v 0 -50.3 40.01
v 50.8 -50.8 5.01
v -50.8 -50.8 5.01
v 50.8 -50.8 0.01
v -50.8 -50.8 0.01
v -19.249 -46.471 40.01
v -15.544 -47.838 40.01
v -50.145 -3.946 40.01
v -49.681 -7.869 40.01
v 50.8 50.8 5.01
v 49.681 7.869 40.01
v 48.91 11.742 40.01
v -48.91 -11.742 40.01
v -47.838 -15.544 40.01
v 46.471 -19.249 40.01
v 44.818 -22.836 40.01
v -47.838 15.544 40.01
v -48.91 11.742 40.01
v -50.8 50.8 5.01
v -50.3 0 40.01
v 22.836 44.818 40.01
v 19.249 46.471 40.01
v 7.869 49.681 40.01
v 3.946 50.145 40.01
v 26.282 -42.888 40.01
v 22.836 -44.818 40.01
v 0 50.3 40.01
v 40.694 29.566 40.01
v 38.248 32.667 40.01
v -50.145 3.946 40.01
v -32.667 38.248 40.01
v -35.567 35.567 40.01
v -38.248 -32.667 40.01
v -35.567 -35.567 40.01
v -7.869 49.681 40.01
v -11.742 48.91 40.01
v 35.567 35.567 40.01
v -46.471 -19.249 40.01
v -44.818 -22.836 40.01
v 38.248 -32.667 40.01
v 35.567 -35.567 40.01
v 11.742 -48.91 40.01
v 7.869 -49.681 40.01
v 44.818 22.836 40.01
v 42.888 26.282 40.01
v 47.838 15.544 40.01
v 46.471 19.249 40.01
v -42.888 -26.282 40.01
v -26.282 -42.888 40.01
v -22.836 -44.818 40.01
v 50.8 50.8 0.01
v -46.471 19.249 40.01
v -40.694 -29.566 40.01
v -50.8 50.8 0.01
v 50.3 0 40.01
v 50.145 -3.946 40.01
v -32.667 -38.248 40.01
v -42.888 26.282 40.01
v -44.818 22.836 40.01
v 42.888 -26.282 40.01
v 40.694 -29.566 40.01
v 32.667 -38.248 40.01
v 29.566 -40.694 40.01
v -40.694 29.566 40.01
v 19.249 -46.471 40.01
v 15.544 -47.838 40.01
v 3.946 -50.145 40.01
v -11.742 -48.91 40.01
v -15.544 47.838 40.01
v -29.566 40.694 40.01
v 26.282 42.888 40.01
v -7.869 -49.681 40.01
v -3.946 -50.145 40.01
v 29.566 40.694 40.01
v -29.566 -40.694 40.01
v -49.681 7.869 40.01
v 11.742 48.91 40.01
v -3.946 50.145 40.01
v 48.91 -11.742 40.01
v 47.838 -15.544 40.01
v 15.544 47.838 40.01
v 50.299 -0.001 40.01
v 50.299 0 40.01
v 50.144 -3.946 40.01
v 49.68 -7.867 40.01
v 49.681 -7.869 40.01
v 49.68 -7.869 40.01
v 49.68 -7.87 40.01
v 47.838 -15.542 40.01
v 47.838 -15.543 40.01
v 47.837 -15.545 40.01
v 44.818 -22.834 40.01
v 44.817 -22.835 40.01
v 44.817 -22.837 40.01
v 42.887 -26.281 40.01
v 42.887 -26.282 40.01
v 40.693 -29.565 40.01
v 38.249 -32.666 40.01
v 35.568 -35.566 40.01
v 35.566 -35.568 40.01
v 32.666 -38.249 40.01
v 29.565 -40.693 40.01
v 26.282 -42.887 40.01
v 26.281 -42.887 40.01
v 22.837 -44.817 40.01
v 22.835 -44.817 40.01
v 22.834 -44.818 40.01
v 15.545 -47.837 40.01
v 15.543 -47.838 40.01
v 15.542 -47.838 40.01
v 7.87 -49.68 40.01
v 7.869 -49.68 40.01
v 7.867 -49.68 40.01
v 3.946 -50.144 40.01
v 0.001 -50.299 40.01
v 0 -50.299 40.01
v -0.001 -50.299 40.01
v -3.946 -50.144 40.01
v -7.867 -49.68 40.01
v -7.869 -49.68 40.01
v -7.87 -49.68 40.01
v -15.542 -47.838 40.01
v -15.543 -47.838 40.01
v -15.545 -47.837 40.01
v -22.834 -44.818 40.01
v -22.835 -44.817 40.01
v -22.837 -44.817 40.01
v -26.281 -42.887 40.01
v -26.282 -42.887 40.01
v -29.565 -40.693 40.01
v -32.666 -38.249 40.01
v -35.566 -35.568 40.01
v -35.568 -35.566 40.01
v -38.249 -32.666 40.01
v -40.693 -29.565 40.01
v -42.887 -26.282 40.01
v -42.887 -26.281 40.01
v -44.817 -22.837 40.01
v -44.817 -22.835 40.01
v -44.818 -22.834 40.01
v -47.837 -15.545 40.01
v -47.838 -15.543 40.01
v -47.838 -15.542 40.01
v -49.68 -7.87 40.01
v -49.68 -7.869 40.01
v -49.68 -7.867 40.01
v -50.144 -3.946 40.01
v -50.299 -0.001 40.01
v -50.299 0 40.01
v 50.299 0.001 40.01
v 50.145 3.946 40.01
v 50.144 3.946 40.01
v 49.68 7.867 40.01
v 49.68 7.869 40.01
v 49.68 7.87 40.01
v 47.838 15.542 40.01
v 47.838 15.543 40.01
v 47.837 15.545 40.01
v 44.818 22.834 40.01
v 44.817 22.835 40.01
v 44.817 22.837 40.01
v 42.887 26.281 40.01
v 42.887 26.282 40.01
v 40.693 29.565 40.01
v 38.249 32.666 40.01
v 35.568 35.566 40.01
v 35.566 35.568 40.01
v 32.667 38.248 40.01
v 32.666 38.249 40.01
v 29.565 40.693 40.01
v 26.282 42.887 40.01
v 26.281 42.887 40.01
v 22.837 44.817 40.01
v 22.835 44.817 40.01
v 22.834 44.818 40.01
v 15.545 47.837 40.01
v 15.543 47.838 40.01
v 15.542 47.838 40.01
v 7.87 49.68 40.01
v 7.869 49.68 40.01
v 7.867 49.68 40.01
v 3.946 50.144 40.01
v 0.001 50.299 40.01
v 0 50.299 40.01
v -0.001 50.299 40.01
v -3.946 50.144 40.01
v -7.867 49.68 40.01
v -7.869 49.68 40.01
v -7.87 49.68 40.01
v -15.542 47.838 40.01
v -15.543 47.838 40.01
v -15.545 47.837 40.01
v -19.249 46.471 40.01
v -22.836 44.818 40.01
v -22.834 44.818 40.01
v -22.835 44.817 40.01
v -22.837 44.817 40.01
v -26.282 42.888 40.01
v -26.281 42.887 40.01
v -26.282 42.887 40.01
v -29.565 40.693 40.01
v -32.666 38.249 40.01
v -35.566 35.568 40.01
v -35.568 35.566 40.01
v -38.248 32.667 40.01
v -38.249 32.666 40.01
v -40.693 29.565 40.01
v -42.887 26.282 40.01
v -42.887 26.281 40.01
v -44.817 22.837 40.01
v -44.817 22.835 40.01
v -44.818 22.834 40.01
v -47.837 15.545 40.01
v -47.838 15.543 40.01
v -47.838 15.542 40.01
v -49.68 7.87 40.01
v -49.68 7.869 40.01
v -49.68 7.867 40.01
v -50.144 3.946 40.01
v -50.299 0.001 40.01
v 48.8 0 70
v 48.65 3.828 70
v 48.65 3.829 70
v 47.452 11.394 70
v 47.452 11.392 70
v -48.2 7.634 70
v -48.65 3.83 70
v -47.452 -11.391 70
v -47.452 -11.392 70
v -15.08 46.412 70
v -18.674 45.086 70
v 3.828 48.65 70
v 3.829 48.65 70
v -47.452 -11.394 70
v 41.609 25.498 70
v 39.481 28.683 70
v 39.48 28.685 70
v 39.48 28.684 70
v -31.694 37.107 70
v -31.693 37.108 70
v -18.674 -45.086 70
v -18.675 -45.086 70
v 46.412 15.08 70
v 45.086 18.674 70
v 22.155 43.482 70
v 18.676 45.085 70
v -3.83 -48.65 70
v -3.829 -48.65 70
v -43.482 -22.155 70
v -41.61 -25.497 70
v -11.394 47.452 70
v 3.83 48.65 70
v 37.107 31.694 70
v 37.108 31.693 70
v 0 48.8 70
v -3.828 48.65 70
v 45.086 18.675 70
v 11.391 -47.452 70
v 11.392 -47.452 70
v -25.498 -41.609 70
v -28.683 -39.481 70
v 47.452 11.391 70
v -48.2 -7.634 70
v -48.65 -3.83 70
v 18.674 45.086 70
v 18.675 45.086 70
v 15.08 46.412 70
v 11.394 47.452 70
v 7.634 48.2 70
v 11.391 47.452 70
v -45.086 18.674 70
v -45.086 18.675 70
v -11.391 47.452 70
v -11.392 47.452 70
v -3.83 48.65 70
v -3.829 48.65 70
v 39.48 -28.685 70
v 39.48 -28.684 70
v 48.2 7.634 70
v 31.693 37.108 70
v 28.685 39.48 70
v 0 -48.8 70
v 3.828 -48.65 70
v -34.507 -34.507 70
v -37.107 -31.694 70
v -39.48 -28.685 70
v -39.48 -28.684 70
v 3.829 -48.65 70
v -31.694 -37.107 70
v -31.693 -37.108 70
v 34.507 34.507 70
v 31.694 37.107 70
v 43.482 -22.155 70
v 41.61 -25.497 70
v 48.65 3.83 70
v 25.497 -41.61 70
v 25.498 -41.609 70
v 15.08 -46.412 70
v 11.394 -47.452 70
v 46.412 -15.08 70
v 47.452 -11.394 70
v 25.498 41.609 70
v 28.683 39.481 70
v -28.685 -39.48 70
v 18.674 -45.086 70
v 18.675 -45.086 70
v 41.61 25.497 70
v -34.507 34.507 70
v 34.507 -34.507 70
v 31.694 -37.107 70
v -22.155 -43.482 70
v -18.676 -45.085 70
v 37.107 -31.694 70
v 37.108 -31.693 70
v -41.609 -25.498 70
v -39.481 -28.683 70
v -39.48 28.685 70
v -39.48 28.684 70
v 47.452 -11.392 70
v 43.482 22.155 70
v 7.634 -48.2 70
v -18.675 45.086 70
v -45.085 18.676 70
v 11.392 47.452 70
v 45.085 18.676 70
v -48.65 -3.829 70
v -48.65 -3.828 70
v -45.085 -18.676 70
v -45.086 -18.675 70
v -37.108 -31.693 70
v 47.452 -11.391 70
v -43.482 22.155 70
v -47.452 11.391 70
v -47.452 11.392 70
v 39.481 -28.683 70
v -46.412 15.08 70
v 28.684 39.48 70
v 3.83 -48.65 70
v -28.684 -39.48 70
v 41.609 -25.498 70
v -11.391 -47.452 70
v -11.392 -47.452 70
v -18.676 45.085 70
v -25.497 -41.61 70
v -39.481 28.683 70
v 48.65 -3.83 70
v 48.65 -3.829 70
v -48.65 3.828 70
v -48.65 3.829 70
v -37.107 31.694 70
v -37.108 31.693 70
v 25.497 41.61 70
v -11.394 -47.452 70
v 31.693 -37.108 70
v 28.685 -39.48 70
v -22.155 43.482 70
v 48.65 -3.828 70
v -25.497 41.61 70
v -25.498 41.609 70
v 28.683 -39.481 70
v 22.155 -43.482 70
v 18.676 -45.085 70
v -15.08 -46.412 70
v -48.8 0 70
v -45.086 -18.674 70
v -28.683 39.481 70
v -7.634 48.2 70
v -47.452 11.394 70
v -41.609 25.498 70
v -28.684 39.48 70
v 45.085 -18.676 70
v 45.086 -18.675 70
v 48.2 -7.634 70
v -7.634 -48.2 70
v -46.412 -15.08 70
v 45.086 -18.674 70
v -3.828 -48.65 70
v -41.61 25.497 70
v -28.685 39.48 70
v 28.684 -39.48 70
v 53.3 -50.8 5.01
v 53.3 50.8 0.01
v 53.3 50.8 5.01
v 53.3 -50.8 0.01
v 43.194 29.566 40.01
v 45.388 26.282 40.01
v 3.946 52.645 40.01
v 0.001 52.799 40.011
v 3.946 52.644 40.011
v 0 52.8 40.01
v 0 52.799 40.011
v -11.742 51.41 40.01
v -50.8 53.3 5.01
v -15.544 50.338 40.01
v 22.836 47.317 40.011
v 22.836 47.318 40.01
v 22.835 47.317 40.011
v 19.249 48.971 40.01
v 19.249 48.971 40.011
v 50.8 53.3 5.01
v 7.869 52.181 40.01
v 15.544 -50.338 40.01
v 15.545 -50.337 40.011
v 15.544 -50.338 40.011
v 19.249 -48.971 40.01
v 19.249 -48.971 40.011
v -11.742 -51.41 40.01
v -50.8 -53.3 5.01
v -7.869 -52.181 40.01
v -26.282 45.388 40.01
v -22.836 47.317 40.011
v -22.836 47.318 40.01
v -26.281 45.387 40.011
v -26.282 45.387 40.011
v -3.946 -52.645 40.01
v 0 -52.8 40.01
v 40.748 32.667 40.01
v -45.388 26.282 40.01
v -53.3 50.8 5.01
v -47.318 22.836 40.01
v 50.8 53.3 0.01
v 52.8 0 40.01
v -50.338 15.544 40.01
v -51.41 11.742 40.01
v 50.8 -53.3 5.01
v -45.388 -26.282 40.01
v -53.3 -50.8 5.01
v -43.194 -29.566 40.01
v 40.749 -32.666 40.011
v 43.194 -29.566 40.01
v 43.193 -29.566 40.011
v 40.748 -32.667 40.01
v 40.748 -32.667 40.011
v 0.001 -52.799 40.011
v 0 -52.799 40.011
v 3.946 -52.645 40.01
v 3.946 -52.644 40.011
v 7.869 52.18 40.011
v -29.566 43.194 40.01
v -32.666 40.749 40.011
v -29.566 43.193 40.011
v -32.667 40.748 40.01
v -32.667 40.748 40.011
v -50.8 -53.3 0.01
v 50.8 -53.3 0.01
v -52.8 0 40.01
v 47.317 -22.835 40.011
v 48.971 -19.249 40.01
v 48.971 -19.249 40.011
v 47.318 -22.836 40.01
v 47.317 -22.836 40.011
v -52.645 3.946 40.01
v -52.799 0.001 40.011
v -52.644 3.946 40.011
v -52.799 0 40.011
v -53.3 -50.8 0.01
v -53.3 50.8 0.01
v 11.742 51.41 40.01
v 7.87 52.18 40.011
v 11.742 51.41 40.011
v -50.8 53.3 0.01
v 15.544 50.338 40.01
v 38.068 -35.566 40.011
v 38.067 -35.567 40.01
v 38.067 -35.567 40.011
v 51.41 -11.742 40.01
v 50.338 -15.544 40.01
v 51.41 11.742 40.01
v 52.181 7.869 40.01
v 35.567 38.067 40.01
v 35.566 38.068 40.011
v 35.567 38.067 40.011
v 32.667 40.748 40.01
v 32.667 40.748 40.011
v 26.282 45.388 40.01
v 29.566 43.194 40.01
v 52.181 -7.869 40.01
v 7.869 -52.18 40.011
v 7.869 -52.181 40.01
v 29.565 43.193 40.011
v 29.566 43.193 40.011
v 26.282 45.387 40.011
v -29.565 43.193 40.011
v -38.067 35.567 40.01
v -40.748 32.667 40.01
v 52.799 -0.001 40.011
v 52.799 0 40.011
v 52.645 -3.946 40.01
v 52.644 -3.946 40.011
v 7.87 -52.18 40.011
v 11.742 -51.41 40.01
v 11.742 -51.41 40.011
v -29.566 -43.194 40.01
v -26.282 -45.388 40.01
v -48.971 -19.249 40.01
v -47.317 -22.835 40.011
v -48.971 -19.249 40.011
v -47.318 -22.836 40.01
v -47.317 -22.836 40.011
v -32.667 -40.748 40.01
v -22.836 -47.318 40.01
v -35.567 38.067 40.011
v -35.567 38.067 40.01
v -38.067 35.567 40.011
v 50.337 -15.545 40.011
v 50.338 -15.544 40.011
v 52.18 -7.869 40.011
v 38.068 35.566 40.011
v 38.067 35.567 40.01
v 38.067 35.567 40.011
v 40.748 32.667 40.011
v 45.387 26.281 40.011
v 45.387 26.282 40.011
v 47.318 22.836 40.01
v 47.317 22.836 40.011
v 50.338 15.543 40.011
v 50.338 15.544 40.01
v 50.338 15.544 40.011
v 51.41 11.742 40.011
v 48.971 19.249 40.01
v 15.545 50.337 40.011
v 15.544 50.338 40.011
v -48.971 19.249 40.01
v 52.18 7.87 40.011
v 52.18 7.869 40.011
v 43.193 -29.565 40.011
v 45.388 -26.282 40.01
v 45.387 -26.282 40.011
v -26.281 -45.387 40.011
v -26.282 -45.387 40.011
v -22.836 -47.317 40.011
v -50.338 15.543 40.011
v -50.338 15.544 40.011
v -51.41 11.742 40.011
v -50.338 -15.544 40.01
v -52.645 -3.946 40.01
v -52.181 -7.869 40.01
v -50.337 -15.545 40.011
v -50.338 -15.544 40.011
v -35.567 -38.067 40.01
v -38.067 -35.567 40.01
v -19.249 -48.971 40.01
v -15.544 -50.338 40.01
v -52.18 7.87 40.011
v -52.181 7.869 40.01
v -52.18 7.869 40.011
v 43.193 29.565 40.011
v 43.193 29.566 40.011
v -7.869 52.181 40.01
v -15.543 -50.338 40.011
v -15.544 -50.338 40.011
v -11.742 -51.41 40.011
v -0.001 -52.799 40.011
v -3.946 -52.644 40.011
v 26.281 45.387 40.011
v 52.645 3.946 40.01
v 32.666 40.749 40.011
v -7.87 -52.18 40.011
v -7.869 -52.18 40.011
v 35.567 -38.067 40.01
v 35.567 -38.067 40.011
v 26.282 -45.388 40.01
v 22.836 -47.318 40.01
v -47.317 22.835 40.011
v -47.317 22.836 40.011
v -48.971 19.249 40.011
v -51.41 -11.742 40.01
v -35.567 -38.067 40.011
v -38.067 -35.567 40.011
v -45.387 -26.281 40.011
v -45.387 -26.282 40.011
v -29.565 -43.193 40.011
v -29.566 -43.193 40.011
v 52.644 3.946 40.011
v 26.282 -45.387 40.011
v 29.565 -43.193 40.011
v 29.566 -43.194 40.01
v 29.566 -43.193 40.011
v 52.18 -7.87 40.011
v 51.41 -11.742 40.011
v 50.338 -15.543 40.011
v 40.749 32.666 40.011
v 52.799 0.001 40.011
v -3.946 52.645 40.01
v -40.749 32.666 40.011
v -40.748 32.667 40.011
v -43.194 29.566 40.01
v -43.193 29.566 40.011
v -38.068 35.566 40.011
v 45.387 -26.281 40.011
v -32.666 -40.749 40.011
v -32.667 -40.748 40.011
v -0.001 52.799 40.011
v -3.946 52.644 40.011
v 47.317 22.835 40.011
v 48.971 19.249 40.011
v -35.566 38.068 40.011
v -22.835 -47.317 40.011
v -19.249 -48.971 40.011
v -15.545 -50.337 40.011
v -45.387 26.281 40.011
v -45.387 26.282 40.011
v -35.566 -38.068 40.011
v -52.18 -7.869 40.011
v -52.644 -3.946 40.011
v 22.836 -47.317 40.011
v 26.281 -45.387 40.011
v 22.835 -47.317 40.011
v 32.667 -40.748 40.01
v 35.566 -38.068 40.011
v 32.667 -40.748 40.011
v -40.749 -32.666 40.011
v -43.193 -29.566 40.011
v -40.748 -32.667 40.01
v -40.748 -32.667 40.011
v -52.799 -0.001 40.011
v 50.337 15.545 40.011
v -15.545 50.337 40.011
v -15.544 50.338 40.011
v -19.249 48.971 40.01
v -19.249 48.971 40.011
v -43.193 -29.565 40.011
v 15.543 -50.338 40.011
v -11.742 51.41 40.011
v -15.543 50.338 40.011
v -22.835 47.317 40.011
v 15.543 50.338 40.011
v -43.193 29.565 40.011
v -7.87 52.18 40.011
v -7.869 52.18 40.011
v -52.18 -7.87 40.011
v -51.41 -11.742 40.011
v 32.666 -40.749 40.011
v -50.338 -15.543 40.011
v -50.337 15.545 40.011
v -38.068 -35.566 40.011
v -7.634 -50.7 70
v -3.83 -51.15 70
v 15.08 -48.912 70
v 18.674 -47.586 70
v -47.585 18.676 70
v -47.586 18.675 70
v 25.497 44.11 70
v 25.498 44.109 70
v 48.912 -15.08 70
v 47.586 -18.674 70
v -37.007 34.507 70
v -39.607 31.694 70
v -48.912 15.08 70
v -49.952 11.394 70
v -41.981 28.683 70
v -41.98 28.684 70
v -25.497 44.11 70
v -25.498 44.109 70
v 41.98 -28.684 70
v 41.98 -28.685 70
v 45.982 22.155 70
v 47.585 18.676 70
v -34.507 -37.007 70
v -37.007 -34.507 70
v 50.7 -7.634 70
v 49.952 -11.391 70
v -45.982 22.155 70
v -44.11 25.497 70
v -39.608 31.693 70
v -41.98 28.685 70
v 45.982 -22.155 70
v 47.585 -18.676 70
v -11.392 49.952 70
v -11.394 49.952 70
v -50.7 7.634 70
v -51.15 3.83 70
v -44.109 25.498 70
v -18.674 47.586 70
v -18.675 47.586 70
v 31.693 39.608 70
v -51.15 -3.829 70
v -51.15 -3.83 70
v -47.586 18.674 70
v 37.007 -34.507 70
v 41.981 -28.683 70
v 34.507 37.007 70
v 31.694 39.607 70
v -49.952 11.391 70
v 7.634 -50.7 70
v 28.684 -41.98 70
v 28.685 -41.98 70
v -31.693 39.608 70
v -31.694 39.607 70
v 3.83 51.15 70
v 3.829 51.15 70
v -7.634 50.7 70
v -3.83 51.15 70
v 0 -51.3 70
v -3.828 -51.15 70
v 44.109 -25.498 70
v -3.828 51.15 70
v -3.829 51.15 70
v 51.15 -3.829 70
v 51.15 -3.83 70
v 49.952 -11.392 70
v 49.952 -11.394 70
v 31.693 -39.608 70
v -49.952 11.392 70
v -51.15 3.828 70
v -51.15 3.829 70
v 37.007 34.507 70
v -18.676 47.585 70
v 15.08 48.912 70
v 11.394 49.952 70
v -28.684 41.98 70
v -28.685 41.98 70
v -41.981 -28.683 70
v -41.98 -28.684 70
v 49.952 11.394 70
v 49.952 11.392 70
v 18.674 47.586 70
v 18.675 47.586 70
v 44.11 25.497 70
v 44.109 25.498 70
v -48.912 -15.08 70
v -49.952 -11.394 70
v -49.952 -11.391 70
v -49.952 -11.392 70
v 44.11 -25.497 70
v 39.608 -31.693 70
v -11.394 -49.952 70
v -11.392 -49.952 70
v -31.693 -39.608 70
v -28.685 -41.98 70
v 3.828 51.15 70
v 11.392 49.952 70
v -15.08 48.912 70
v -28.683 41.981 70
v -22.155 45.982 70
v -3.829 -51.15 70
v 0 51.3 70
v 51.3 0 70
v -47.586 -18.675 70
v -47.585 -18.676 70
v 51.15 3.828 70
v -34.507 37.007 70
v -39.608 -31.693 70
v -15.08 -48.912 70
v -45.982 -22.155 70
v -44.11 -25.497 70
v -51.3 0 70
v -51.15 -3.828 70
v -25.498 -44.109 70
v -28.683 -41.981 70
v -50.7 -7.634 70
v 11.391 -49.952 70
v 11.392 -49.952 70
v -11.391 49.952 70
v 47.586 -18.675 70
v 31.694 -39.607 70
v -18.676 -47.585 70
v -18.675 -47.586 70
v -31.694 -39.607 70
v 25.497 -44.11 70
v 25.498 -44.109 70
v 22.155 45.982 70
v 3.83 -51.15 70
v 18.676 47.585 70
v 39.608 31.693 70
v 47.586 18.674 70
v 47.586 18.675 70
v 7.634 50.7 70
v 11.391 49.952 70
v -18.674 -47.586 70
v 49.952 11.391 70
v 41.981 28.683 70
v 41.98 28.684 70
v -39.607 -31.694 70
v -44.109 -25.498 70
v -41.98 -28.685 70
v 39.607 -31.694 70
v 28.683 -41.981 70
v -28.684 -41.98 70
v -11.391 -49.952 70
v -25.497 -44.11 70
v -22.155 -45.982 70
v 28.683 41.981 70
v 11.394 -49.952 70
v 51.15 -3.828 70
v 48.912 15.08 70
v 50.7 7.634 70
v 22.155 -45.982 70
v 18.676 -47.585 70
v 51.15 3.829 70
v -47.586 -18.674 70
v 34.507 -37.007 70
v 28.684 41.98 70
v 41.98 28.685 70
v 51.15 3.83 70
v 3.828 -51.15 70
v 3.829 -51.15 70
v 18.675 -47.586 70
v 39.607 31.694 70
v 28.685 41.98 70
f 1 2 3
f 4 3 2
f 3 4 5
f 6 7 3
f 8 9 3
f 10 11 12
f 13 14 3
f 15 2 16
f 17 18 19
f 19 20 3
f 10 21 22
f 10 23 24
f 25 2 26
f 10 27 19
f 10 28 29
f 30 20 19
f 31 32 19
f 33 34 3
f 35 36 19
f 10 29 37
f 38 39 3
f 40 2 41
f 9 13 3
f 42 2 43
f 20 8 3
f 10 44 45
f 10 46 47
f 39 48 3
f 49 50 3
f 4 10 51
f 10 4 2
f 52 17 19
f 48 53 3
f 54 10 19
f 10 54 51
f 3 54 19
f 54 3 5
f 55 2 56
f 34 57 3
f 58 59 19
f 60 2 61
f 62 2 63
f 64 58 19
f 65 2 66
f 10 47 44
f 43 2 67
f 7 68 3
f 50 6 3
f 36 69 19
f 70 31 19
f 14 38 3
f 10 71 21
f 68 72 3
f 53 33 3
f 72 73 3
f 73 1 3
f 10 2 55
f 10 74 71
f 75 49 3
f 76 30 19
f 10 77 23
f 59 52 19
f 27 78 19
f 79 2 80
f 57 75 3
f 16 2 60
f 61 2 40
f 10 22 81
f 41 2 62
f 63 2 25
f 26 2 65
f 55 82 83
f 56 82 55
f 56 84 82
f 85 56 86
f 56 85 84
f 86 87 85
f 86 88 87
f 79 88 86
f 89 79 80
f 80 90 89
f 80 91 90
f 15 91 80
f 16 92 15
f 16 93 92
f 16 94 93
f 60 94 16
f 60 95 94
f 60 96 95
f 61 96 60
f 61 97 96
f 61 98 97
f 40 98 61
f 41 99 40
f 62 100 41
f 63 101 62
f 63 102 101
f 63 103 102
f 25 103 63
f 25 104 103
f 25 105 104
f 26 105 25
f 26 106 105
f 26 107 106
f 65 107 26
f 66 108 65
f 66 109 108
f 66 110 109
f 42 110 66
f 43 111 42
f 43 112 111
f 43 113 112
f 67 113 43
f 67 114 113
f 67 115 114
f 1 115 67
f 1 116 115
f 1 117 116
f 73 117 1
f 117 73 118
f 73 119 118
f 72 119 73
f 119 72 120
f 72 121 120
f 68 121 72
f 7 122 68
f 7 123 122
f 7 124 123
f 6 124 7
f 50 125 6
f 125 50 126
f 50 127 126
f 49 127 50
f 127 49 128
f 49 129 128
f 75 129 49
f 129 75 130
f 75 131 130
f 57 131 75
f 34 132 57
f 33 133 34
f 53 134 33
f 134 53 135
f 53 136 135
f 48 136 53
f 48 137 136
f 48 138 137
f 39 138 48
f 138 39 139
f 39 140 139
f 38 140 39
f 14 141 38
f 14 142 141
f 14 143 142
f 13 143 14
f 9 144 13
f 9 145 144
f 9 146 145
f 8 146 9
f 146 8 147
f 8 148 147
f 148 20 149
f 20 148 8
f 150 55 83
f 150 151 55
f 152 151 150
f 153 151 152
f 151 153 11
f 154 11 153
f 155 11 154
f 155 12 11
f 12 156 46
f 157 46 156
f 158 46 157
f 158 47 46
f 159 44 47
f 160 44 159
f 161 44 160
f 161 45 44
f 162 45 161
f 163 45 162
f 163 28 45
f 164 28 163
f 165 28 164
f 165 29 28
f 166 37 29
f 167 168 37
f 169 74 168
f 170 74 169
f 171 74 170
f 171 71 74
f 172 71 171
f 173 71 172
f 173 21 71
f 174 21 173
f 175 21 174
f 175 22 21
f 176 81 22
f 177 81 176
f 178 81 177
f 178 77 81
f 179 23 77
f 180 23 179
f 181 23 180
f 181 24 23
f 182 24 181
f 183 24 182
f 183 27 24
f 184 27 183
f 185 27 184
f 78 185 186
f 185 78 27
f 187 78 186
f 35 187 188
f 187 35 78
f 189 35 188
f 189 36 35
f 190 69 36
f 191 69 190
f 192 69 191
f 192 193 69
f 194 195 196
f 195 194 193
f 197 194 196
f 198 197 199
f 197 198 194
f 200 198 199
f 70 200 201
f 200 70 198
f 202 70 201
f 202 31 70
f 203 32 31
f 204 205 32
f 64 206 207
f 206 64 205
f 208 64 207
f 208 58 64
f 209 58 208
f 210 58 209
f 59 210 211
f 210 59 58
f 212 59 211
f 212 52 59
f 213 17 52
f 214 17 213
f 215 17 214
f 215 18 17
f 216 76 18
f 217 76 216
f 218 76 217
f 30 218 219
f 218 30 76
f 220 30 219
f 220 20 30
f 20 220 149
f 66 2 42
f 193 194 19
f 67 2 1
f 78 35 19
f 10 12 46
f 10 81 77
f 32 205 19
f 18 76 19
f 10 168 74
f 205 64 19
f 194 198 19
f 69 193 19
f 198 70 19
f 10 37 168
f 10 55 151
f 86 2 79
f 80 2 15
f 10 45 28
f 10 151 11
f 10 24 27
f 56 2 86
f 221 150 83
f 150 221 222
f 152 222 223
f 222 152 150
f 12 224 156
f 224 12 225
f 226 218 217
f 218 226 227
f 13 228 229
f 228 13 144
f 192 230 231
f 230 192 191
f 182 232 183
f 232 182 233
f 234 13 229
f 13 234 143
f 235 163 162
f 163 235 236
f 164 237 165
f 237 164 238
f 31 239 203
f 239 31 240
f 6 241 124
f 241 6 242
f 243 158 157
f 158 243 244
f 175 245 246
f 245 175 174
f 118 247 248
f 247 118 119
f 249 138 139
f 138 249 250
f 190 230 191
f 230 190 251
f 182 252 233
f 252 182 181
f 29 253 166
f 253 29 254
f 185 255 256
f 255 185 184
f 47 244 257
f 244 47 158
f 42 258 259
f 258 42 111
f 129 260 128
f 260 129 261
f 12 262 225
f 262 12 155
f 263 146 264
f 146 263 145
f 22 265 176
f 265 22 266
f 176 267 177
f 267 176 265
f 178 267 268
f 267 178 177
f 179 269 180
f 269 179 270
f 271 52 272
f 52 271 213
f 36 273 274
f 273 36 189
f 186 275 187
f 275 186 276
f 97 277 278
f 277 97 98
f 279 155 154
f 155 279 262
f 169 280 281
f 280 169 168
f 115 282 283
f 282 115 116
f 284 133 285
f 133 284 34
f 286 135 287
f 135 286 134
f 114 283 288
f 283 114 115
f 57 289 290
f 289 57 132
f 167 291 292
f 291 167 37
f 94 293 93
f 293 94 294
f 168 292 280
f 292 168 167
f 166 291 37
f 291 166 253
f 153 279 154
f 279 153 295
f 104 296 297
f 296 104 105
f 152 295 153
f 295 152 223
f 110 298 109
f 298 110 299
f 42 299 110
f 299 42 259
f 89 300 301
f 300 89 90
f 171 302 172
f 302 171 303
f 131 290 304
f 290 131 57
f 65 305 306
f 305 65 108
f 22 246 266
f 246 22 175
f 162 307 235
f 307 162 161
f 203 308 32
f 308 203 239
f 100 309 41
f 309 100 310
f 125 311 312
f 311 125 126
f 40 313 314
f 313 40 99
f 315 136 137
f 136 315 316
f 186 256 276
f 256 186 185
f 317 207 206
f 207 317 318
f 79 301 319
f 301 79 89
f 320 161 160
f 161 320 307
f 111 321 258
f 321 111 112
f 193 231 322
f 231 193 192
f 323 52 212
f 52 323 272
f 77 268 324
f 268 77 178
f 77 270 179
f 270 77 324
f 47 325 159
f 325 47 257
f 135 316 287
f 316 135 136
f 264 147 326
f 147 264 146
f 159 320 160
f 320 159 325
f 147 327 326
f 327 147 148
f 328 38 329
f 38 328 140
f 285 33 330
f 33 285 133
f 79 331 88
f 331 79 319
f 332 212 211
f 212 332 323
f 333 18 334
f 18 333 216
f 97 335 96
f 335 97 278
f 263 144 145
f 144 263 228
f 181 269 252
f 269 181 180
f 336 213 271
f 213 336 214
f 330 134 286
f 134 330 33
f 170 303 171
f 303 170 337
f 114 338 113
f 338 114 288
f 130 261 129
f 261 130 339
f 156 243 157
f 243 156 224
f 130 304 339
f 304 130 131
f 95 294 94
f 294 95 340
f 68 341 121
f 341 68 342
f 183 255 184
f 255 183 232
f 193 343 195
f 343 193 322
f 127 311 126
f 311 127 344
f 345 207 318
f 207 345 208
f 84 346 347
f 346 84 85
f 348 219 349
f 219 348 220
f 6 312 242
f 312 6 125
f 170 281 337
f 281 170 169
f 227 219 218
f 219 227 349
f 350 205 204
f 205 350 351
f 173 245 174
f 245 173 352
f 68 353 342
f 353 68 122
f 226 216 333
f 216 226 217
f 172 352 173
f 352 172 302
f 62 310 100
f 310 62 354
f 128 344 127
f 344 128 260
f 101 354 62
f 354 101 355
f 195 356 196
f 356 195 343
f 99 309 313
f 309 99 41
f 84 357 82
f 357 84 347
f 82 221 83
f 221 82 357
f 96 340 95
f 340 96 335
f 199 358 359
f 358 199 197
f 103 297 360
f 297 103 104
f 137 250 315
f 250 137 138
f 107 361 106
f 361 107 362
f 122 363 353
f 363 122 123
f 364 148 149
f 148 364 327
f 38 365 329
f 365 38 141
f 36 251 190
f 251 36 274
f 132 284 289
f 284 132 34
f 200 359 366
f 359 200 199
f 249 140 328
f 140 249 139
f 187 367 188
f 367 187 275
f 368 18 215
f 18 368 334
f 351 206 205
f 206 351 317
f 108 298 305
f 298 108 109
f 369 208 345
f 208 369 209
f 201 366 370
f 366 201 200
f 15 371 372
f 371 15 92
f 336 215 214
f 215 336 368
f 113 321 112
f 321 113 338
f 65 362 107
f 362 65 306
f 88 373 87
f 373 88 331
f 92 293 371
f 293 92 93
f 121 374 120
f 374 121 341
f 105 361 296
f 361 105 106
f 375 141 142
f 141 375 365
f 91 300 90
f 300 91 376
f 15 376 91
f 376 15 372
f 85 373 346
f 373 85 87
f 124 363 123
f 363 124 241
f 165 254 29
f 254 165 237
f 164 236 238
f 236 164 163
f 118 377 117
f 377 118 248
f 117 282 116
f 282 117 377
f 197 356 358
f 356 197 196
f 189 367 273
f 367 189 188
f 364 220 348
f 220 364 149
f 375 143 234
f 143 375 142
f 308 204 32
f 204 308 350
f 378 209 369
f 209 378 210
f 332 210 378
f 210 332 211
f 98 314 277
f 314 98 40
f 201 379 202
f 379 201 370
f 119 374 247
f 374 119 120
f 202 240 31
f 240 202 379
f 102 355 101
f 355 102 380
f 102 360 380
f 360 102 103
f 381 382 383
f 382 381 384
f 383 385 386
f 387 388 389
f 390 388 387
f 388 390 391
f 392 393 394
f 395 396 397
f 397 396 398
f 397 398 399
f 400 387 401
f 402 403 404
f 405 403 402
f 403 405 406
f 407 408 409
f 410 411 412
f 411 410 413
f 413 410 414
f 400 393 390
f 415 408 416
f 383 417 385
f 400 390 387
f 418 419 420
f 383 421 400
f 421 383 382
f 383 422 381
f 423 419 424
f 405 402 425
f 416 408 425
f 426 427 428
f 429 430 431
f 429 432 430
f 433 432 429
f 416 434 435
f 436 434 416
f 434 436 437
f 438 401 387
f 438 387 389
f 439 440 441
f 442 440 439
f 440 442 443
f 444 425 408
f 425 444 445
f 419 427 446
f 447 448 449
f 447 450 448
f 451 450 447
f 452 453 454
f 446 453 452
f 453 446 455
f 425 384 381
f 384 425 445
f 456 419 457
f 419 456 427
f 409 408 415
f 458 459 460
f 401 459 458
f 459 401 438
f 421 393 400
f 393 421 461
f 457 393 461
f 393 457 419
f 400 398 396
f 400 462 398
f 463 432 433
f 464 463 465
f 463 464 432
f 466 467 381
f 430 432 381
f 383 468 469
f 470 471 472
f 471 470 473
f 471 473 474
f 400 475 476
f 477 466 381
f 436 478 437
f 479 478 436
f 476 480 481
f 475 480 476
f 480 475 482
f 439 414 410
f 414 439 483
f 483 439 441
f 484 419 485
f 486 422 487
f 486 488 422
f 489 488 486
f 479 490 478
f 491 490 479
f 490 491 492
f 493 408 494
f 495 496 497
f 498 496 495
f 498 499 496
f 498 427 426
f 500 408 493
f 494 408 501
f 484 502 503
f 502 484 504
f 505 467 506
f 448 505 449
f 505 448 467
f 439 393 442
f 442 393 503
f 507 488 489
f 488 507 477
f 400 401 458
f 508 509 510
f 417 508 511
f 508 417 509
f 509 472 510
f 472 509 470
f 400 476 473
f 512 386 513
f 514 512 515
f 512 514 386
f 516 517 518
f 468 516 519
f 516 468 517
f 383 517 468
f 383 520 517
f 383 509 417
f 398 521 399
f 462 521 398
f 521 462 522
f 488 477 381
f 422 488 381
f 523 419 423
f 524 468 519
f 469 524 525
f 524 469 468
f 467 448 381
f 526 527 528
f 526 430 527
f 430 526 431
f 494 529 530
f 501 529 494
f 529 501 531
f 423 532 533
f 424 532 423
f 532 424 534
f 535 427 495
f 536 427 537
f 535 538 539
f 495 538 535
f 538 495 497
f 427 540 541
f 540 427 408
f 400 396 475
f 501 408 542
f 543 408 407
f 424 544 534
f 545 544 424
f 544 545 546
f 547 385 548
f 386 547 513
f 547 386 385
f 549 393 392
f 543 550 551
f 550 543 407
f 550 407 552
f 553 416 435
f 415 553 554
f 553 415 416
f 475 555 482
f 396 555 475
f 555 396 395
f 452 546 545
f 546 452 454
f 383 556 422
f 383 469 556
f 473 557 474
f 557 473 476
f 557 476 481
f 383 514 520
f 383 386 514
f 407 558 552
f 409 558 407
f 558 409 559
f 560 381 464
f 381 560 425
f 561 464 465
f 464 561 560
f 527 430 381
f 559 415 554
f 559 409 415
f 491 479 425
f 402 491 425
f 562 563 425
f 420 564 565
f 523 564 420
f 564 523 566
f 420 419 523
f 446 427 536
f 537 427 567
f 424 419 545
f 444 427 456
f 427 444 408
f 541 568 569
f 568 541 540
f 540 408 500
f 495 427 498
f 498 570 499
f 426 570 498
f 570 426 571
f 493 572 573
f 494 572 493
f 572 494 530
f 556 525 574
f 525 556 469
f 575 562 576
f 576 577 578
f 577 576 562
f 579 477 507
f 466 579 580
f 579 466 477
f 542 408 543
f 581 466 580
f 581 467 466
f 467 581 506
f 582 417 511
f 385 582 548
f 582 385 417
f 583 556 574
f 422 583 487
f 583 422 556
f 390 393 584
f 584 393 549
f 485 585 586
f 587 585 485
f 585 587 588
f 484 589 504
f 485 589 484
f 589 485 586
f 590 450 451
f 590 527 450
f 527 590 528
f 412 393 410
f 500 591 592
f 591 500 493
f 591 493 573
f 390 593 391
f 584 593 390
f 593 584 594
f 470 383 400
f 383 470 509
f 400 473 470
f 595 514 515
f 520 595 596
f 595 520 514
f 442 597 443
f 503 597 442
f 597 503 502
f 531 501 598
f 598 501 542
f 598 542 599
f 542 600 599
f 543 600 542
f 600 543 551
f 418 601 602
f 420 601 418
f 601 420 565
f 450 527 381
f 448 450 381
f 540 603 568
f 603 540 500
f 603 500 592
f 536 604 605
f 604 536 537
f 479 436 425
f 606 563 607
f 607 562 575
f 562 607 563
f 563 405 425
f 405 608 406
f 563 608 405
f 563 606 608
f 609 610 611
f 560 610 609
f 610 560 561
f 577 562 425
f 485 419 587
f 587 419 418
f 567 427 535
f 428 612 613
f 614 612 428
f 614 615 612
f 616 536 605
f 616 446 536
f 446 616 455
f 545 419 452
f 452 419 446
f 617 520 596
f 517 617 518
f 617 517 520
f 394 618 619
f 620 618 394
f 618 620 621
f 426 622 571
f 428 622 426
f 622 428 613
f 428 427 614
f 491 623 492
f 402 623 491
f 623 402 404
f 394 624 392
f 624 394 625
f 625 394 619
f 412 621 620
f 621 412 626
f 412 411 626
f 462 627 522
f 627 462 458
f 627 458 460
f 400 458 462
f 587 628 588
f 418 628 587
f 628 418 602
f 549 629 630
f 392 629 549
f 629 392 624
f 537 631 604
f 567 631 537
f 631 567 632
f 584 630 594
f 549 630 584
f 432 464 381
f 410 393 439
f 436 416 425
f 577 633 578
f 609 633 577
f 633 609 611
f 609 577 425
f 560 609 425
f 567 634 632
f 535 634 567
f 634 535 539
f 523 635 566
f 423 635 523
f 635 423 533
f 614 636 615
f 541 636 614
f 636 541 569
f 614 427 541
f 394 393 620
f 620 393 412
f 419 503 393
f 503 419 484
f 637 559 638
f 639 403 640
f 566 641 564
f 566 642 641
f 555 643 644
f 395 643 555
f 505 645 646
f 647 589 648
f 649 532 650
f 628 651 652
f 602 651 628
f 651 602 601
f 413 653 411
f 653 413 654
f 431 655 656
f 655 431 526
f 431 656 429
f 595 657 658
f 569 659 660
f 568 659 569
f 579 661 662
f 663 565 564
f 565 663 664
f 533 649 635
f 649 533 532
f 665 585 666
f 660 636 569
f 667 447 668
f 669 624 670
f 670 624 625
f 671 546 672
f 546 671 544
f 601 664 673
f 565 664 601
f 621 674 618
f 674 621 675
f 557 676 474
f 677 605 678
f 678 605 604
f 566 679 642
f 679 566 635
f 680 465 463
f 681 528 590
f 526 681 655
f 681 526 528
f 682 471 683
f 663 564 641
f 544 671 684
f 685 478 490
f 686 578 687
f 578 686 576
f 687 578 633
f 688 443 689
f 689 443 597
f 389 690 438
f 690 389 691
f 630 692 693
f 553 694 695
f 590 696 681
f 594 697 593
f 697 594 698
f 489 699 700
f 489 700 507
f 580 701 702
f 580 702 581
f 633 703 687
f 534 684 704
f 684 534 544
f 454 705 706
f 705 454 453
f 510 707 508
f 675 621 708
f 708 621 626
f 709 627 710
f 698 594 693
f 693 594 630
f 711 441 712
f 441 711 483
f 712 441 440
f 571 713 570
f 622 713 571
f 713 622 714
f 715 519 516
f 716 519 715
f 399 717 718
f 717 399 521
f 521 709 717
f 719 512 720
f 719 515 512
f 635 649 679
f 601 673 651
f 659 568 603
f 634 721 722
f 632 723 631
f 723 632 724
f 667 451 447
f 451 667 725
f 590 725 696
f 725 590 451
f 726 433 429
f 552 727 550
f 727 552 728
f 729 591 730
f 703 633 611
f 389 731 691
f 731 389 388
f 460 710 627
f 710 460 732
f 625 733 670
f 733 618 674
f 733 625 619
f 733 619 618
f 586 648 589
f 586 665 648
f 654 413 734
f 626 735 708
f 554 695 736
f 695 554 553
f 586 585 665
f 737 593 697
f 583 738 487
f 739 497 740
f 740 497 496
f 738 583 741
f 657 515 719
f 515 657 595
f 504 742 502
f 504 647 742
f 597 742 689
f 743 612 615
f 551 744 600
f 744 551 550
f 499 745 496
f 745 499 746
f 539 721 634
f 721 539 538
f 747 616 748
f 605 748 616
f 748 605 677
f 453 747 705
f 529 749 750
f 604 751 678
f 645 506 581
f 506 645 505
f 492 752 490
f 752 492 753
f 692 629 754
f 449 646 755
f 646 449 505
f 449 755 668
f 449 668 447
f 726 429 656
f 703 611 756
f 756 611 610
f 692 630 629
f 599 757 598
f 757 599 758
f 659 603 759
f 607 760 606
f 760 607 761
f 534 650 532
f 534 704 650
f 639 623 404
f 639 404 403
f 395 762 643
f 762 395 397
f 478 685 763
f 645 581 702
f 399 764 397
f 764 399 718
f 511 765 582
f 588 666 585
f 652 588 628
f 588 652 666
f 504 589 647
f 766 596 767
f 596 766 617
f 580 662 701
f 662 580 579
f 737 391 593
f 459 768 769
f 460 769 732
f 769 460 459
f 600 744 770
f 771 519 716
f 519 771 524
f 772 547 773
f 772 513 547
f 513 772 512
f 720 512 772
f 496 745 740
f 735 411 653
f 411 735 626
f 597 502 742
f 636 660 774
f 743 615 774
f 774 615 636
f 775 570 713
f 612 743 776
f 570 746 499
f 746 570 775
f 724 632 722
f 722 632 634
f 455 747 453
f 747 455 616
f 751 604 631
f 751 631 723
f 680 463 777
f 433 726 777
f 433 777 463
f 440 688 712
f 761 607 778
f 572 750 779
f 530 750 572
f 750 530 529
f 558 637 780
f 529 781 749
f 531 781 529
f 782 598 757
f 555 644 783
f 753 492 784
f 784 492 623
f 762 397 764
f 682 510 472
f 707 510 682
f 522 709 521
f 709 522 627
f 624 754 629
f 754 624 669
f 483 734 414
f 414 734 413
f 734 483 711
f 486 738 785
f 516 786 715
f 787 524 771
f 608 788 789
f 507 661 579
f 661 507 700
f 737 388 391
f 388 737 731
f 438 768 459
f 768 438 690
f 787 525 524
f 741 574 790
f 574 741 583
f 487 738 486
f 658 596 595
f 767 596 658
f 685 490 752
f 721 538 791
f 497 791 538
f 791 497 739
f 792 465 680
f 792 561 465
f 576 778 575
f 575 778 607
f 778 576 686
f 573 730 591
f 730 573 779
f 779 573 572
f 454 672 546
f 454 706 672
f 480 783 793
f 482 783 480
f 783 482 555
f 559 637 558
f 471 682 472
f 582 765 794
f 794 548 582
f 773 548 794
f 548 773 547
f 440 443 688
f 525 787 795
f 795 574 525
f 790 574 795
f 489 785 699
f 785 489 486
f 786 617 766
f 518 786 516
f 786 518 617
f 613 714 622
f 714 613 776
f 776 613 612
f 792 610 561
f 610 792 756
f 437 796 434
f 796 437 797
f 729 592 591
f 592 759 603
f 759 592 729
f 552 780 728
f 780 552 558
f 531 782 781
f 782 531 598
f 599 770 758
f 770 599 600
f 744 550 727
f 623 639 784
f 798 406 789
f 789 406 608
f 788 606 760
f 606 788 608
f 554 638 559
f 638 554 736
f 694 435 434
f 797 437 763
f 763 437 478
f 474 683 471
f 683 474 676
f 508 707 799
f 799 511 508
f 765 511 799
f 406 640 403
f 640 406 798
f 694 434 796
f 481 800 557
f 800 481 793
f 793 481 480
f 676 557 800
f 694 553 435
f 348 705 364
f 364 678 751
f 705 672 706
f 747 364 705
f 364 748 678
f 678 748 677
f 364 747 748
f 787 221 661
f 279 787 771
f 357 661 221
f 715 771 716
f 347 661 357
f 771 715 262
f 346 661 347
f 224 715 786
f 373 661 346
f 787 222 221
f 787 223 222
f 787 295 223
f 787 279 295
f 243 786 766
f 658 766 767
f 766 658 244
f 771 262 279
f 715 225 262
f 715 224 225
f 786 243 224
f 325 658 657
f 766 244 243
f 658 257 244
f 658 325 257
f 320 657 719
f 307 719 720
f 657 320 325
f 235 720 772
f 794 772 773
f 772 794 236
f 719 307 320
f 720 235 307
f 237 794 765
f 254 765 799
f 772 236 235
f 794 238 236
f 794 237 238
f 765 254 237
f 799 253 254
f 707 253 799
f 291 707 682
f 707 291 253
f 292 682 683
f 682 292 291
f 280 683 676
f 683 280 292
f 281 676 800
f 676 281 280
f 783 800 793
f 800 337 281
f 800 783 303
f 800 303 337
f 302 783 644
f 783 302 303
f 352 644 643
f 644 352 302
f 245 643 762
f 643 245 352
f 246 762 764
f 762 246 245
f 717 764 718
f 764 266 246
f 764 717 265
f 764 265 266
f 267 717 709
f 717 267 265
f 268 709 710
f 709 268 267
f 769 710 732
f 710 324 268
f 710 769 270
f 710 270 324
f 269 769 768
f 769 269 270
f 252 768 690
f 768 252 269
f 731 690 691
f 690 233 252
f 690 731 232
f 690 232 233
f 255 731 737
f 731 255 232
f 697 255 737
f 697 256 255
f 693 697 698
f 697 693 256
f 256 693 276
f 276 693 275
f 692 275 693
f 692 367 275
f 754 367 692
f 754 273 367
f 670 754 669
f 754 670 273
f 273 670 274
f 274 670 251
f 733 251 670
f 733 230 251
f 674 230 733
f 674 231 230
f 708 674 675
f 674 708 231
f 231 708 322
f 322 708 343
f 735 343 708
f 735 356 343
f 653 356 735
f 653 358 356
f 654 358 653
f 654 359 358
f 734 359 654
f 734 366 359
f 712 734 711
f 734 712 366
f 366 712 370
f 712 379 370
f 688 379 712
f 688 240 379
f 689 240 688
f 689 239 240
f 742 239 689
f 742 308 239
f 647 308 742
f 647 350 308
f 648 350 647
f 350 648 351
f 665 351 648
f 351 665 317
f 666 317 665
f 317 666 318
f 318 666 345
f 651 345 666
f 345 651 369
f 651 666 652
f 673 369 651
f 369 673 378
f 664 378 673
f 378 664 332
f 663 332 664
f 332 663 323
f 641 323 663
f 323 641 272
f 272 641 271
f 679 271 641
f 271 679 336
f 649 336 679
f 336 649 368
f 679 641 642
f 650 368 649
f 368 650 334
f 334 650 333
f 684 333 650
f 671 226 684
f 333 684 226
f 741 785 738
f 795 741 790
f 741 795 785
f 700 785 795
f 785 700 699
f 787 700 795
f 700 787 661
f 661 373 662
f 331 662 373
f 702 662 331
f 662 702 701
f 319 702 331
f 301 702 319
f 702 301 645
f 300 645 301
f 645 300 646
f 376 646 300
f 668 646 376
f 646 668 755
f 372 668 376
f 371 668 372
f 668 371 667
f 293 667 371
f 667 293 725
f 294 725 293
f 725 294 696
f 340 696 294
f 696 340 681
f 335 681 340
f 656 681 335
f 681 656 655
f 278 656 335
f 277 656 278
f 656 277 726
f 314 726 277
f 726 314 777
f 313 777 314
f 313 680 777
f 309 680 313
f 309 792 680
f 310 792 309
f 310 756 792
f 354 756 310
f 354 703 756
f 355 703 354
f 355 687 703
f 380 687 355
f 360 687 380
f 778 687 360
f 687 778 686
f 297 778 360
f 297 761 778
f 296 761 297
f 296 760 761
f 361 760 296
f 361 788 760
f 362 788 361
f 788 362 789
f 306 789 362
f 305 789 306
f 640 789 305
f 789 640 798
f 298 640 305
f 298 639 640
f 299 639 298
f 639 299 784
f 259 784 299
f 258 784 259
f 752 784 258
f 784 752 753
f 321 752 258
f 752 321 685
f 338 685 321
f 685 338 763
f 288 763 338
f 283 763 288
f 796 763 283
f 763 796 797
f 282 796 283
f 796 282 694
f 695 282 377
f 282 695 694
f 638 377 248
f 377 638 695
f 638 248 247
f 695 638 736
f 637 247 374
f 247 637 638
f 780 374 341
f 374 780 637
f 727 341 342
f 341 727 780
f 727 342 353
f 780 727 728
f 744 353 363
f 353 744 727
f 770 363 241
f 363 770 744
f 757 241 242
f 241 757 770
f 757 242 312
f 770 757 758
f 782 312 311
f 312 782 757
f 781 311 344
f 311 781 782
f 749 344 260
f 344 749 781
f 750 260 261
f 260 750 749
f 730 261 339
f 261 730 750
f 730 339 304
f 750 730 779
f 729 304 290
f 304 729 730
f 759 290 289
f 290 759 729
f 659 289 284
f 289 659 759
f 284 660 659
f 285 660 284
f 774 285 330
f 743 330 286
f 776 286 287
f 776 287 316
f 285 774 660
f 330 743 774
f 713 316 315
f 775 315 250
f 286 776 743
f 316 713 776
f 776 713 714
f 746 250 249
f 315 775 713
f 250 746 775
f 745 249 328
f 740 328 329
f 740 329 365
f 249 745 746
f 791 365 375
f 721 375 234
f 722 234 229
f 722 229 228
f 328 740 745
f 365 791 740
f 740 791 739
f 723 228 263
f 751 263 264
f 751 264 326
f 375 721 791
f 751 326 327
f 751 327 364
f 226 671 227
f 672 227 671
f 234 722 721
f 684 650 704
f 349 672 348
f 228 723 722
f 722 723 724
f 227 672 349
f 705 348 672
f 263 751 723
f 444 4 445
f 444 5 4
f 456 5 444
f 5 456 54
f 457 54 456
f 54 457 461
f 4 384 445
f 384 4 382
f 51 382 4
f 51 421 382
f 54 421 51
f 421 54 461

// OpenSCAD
// file: lib-constants.scad
fan_mounting_hole_spacing = 105;
fan_mounting_hole_diameter = 4.3;  // slightly oversized for #8, will probably need drilling anyway
fan_frame_width = 120;

duct_diameter_nominal = 25.4 /* conversion */ * 4 /* inches */;
duct_taper_extreme = 1.5;
duct_fitting_length = 30;

minimum_roundover = (fan_frame_width - fan_mounting_hole_spacing) / 2;
cylinder_fn = 80;

module mounting_plate(roundover_and_margin, plate_thick, hole_dia) {
  difference() {
        minkowski() {
            // each of these has half height so the sum is full height
            cylinder(r=roundover_and_margin, h=plate_thick / 2, center=true);
            cube([fan_mounting_hole_spacing, fan_mounting_hole_spacing, plate_thick / 2], center=true);
        }
        
        cylinder(d=hole_dia, h=plate_thick * 2, center=true, $fn=cylinder_fn);
        
        frame_hole_negative();
    }
}

module frame_hole_negative(h=1000) {
    frame_hole_pattern() cylinder(d=fan_mounting_hole_diameter, h=h, center=true);
}

module frame_hole_pattern() {
    r = fan_mounting_hole_spacing / 2;
    translate([ r,  r, 0]) children();
    translate([-r,  r, 0]) children();
    translate([ r, -r, 0]) children();
    translate([-r, -r, 0]) children();
}
// main file
include <lib-constants.scad>


duct_end_vent();


module duct_end_vent() {
    wall_thickness = 2.5;
    box_end_z = 10;
    taper_end_z = 40;
    epsilon = 0.01;

    duct_od_base = duct_diameter_nominal + duct_taper_extreme;
    duct_od_tip = duct_diameter_nominal - duct_taper_extreme;

    $fn = cylinder_fn;

    module interior_form(extra=false) {
        hull() {
            translate([-0.5, -0.5, 0] * duct_diameter_nominal)
            cube([duct_diameter_nominal, duct_diameter_nominal, box_end_z / 2 + epsilon]);
            
            translate([0, 0, taper_end_z])
            cylinder(d=duct_od_base - wall_thickness, h=epsilon);
        }
        
        translate([0, 0, taper_end_z])
        cylinder(
            d1=duct_od_base - wall_thickness,
            d2=duct_od_tip - wall_thickness,
            h=duct_fitting_length + epsilon);
    }

    module main() {
        difference() {
            minkowski(convexity=6) {
                interior_form(false);
                octahedron(wall_thickness);
            }
            interior_form(true);
            
            // cut top open flat
            translate([0, 0, duct_fitting_length + taper_end_z]) 
            cylinder(d=duct_diameter_nominal * 2, h=wall_thickness * 2);
            
            // cut bottom open flat
            translate([0, 0, epsilon]) 
            mirror([0, 0, 1])
            cylinder(d=duct_diameter_nominal * 2, h=wall_thickness * 2);
        }
    }

    difference() {
        main();
        
        // cut for debugging
        *translate([0, 0, 0]) cube([100, 100, 100]);
    }

    module octahedron(r) {
        scale([r, r, r])
        polyhedron(
            points=[
                [1, 0, 0],
                [-1, 0, 0],
                [0, 1, 0], 
                [0, -1, 0],
                [0, 0, 1],
                [0, 0, -1],
            ],
            faces=[
                [0, 4, 2],
                [0, 2, 5],
                [0, 3, 4],
                [0, 5, 3],
                [1, 2, 4],
                [1, 5, 2],
                [1, 4, 3],
                [1, 3, 5],
            ], convexity=1);
    }
}
